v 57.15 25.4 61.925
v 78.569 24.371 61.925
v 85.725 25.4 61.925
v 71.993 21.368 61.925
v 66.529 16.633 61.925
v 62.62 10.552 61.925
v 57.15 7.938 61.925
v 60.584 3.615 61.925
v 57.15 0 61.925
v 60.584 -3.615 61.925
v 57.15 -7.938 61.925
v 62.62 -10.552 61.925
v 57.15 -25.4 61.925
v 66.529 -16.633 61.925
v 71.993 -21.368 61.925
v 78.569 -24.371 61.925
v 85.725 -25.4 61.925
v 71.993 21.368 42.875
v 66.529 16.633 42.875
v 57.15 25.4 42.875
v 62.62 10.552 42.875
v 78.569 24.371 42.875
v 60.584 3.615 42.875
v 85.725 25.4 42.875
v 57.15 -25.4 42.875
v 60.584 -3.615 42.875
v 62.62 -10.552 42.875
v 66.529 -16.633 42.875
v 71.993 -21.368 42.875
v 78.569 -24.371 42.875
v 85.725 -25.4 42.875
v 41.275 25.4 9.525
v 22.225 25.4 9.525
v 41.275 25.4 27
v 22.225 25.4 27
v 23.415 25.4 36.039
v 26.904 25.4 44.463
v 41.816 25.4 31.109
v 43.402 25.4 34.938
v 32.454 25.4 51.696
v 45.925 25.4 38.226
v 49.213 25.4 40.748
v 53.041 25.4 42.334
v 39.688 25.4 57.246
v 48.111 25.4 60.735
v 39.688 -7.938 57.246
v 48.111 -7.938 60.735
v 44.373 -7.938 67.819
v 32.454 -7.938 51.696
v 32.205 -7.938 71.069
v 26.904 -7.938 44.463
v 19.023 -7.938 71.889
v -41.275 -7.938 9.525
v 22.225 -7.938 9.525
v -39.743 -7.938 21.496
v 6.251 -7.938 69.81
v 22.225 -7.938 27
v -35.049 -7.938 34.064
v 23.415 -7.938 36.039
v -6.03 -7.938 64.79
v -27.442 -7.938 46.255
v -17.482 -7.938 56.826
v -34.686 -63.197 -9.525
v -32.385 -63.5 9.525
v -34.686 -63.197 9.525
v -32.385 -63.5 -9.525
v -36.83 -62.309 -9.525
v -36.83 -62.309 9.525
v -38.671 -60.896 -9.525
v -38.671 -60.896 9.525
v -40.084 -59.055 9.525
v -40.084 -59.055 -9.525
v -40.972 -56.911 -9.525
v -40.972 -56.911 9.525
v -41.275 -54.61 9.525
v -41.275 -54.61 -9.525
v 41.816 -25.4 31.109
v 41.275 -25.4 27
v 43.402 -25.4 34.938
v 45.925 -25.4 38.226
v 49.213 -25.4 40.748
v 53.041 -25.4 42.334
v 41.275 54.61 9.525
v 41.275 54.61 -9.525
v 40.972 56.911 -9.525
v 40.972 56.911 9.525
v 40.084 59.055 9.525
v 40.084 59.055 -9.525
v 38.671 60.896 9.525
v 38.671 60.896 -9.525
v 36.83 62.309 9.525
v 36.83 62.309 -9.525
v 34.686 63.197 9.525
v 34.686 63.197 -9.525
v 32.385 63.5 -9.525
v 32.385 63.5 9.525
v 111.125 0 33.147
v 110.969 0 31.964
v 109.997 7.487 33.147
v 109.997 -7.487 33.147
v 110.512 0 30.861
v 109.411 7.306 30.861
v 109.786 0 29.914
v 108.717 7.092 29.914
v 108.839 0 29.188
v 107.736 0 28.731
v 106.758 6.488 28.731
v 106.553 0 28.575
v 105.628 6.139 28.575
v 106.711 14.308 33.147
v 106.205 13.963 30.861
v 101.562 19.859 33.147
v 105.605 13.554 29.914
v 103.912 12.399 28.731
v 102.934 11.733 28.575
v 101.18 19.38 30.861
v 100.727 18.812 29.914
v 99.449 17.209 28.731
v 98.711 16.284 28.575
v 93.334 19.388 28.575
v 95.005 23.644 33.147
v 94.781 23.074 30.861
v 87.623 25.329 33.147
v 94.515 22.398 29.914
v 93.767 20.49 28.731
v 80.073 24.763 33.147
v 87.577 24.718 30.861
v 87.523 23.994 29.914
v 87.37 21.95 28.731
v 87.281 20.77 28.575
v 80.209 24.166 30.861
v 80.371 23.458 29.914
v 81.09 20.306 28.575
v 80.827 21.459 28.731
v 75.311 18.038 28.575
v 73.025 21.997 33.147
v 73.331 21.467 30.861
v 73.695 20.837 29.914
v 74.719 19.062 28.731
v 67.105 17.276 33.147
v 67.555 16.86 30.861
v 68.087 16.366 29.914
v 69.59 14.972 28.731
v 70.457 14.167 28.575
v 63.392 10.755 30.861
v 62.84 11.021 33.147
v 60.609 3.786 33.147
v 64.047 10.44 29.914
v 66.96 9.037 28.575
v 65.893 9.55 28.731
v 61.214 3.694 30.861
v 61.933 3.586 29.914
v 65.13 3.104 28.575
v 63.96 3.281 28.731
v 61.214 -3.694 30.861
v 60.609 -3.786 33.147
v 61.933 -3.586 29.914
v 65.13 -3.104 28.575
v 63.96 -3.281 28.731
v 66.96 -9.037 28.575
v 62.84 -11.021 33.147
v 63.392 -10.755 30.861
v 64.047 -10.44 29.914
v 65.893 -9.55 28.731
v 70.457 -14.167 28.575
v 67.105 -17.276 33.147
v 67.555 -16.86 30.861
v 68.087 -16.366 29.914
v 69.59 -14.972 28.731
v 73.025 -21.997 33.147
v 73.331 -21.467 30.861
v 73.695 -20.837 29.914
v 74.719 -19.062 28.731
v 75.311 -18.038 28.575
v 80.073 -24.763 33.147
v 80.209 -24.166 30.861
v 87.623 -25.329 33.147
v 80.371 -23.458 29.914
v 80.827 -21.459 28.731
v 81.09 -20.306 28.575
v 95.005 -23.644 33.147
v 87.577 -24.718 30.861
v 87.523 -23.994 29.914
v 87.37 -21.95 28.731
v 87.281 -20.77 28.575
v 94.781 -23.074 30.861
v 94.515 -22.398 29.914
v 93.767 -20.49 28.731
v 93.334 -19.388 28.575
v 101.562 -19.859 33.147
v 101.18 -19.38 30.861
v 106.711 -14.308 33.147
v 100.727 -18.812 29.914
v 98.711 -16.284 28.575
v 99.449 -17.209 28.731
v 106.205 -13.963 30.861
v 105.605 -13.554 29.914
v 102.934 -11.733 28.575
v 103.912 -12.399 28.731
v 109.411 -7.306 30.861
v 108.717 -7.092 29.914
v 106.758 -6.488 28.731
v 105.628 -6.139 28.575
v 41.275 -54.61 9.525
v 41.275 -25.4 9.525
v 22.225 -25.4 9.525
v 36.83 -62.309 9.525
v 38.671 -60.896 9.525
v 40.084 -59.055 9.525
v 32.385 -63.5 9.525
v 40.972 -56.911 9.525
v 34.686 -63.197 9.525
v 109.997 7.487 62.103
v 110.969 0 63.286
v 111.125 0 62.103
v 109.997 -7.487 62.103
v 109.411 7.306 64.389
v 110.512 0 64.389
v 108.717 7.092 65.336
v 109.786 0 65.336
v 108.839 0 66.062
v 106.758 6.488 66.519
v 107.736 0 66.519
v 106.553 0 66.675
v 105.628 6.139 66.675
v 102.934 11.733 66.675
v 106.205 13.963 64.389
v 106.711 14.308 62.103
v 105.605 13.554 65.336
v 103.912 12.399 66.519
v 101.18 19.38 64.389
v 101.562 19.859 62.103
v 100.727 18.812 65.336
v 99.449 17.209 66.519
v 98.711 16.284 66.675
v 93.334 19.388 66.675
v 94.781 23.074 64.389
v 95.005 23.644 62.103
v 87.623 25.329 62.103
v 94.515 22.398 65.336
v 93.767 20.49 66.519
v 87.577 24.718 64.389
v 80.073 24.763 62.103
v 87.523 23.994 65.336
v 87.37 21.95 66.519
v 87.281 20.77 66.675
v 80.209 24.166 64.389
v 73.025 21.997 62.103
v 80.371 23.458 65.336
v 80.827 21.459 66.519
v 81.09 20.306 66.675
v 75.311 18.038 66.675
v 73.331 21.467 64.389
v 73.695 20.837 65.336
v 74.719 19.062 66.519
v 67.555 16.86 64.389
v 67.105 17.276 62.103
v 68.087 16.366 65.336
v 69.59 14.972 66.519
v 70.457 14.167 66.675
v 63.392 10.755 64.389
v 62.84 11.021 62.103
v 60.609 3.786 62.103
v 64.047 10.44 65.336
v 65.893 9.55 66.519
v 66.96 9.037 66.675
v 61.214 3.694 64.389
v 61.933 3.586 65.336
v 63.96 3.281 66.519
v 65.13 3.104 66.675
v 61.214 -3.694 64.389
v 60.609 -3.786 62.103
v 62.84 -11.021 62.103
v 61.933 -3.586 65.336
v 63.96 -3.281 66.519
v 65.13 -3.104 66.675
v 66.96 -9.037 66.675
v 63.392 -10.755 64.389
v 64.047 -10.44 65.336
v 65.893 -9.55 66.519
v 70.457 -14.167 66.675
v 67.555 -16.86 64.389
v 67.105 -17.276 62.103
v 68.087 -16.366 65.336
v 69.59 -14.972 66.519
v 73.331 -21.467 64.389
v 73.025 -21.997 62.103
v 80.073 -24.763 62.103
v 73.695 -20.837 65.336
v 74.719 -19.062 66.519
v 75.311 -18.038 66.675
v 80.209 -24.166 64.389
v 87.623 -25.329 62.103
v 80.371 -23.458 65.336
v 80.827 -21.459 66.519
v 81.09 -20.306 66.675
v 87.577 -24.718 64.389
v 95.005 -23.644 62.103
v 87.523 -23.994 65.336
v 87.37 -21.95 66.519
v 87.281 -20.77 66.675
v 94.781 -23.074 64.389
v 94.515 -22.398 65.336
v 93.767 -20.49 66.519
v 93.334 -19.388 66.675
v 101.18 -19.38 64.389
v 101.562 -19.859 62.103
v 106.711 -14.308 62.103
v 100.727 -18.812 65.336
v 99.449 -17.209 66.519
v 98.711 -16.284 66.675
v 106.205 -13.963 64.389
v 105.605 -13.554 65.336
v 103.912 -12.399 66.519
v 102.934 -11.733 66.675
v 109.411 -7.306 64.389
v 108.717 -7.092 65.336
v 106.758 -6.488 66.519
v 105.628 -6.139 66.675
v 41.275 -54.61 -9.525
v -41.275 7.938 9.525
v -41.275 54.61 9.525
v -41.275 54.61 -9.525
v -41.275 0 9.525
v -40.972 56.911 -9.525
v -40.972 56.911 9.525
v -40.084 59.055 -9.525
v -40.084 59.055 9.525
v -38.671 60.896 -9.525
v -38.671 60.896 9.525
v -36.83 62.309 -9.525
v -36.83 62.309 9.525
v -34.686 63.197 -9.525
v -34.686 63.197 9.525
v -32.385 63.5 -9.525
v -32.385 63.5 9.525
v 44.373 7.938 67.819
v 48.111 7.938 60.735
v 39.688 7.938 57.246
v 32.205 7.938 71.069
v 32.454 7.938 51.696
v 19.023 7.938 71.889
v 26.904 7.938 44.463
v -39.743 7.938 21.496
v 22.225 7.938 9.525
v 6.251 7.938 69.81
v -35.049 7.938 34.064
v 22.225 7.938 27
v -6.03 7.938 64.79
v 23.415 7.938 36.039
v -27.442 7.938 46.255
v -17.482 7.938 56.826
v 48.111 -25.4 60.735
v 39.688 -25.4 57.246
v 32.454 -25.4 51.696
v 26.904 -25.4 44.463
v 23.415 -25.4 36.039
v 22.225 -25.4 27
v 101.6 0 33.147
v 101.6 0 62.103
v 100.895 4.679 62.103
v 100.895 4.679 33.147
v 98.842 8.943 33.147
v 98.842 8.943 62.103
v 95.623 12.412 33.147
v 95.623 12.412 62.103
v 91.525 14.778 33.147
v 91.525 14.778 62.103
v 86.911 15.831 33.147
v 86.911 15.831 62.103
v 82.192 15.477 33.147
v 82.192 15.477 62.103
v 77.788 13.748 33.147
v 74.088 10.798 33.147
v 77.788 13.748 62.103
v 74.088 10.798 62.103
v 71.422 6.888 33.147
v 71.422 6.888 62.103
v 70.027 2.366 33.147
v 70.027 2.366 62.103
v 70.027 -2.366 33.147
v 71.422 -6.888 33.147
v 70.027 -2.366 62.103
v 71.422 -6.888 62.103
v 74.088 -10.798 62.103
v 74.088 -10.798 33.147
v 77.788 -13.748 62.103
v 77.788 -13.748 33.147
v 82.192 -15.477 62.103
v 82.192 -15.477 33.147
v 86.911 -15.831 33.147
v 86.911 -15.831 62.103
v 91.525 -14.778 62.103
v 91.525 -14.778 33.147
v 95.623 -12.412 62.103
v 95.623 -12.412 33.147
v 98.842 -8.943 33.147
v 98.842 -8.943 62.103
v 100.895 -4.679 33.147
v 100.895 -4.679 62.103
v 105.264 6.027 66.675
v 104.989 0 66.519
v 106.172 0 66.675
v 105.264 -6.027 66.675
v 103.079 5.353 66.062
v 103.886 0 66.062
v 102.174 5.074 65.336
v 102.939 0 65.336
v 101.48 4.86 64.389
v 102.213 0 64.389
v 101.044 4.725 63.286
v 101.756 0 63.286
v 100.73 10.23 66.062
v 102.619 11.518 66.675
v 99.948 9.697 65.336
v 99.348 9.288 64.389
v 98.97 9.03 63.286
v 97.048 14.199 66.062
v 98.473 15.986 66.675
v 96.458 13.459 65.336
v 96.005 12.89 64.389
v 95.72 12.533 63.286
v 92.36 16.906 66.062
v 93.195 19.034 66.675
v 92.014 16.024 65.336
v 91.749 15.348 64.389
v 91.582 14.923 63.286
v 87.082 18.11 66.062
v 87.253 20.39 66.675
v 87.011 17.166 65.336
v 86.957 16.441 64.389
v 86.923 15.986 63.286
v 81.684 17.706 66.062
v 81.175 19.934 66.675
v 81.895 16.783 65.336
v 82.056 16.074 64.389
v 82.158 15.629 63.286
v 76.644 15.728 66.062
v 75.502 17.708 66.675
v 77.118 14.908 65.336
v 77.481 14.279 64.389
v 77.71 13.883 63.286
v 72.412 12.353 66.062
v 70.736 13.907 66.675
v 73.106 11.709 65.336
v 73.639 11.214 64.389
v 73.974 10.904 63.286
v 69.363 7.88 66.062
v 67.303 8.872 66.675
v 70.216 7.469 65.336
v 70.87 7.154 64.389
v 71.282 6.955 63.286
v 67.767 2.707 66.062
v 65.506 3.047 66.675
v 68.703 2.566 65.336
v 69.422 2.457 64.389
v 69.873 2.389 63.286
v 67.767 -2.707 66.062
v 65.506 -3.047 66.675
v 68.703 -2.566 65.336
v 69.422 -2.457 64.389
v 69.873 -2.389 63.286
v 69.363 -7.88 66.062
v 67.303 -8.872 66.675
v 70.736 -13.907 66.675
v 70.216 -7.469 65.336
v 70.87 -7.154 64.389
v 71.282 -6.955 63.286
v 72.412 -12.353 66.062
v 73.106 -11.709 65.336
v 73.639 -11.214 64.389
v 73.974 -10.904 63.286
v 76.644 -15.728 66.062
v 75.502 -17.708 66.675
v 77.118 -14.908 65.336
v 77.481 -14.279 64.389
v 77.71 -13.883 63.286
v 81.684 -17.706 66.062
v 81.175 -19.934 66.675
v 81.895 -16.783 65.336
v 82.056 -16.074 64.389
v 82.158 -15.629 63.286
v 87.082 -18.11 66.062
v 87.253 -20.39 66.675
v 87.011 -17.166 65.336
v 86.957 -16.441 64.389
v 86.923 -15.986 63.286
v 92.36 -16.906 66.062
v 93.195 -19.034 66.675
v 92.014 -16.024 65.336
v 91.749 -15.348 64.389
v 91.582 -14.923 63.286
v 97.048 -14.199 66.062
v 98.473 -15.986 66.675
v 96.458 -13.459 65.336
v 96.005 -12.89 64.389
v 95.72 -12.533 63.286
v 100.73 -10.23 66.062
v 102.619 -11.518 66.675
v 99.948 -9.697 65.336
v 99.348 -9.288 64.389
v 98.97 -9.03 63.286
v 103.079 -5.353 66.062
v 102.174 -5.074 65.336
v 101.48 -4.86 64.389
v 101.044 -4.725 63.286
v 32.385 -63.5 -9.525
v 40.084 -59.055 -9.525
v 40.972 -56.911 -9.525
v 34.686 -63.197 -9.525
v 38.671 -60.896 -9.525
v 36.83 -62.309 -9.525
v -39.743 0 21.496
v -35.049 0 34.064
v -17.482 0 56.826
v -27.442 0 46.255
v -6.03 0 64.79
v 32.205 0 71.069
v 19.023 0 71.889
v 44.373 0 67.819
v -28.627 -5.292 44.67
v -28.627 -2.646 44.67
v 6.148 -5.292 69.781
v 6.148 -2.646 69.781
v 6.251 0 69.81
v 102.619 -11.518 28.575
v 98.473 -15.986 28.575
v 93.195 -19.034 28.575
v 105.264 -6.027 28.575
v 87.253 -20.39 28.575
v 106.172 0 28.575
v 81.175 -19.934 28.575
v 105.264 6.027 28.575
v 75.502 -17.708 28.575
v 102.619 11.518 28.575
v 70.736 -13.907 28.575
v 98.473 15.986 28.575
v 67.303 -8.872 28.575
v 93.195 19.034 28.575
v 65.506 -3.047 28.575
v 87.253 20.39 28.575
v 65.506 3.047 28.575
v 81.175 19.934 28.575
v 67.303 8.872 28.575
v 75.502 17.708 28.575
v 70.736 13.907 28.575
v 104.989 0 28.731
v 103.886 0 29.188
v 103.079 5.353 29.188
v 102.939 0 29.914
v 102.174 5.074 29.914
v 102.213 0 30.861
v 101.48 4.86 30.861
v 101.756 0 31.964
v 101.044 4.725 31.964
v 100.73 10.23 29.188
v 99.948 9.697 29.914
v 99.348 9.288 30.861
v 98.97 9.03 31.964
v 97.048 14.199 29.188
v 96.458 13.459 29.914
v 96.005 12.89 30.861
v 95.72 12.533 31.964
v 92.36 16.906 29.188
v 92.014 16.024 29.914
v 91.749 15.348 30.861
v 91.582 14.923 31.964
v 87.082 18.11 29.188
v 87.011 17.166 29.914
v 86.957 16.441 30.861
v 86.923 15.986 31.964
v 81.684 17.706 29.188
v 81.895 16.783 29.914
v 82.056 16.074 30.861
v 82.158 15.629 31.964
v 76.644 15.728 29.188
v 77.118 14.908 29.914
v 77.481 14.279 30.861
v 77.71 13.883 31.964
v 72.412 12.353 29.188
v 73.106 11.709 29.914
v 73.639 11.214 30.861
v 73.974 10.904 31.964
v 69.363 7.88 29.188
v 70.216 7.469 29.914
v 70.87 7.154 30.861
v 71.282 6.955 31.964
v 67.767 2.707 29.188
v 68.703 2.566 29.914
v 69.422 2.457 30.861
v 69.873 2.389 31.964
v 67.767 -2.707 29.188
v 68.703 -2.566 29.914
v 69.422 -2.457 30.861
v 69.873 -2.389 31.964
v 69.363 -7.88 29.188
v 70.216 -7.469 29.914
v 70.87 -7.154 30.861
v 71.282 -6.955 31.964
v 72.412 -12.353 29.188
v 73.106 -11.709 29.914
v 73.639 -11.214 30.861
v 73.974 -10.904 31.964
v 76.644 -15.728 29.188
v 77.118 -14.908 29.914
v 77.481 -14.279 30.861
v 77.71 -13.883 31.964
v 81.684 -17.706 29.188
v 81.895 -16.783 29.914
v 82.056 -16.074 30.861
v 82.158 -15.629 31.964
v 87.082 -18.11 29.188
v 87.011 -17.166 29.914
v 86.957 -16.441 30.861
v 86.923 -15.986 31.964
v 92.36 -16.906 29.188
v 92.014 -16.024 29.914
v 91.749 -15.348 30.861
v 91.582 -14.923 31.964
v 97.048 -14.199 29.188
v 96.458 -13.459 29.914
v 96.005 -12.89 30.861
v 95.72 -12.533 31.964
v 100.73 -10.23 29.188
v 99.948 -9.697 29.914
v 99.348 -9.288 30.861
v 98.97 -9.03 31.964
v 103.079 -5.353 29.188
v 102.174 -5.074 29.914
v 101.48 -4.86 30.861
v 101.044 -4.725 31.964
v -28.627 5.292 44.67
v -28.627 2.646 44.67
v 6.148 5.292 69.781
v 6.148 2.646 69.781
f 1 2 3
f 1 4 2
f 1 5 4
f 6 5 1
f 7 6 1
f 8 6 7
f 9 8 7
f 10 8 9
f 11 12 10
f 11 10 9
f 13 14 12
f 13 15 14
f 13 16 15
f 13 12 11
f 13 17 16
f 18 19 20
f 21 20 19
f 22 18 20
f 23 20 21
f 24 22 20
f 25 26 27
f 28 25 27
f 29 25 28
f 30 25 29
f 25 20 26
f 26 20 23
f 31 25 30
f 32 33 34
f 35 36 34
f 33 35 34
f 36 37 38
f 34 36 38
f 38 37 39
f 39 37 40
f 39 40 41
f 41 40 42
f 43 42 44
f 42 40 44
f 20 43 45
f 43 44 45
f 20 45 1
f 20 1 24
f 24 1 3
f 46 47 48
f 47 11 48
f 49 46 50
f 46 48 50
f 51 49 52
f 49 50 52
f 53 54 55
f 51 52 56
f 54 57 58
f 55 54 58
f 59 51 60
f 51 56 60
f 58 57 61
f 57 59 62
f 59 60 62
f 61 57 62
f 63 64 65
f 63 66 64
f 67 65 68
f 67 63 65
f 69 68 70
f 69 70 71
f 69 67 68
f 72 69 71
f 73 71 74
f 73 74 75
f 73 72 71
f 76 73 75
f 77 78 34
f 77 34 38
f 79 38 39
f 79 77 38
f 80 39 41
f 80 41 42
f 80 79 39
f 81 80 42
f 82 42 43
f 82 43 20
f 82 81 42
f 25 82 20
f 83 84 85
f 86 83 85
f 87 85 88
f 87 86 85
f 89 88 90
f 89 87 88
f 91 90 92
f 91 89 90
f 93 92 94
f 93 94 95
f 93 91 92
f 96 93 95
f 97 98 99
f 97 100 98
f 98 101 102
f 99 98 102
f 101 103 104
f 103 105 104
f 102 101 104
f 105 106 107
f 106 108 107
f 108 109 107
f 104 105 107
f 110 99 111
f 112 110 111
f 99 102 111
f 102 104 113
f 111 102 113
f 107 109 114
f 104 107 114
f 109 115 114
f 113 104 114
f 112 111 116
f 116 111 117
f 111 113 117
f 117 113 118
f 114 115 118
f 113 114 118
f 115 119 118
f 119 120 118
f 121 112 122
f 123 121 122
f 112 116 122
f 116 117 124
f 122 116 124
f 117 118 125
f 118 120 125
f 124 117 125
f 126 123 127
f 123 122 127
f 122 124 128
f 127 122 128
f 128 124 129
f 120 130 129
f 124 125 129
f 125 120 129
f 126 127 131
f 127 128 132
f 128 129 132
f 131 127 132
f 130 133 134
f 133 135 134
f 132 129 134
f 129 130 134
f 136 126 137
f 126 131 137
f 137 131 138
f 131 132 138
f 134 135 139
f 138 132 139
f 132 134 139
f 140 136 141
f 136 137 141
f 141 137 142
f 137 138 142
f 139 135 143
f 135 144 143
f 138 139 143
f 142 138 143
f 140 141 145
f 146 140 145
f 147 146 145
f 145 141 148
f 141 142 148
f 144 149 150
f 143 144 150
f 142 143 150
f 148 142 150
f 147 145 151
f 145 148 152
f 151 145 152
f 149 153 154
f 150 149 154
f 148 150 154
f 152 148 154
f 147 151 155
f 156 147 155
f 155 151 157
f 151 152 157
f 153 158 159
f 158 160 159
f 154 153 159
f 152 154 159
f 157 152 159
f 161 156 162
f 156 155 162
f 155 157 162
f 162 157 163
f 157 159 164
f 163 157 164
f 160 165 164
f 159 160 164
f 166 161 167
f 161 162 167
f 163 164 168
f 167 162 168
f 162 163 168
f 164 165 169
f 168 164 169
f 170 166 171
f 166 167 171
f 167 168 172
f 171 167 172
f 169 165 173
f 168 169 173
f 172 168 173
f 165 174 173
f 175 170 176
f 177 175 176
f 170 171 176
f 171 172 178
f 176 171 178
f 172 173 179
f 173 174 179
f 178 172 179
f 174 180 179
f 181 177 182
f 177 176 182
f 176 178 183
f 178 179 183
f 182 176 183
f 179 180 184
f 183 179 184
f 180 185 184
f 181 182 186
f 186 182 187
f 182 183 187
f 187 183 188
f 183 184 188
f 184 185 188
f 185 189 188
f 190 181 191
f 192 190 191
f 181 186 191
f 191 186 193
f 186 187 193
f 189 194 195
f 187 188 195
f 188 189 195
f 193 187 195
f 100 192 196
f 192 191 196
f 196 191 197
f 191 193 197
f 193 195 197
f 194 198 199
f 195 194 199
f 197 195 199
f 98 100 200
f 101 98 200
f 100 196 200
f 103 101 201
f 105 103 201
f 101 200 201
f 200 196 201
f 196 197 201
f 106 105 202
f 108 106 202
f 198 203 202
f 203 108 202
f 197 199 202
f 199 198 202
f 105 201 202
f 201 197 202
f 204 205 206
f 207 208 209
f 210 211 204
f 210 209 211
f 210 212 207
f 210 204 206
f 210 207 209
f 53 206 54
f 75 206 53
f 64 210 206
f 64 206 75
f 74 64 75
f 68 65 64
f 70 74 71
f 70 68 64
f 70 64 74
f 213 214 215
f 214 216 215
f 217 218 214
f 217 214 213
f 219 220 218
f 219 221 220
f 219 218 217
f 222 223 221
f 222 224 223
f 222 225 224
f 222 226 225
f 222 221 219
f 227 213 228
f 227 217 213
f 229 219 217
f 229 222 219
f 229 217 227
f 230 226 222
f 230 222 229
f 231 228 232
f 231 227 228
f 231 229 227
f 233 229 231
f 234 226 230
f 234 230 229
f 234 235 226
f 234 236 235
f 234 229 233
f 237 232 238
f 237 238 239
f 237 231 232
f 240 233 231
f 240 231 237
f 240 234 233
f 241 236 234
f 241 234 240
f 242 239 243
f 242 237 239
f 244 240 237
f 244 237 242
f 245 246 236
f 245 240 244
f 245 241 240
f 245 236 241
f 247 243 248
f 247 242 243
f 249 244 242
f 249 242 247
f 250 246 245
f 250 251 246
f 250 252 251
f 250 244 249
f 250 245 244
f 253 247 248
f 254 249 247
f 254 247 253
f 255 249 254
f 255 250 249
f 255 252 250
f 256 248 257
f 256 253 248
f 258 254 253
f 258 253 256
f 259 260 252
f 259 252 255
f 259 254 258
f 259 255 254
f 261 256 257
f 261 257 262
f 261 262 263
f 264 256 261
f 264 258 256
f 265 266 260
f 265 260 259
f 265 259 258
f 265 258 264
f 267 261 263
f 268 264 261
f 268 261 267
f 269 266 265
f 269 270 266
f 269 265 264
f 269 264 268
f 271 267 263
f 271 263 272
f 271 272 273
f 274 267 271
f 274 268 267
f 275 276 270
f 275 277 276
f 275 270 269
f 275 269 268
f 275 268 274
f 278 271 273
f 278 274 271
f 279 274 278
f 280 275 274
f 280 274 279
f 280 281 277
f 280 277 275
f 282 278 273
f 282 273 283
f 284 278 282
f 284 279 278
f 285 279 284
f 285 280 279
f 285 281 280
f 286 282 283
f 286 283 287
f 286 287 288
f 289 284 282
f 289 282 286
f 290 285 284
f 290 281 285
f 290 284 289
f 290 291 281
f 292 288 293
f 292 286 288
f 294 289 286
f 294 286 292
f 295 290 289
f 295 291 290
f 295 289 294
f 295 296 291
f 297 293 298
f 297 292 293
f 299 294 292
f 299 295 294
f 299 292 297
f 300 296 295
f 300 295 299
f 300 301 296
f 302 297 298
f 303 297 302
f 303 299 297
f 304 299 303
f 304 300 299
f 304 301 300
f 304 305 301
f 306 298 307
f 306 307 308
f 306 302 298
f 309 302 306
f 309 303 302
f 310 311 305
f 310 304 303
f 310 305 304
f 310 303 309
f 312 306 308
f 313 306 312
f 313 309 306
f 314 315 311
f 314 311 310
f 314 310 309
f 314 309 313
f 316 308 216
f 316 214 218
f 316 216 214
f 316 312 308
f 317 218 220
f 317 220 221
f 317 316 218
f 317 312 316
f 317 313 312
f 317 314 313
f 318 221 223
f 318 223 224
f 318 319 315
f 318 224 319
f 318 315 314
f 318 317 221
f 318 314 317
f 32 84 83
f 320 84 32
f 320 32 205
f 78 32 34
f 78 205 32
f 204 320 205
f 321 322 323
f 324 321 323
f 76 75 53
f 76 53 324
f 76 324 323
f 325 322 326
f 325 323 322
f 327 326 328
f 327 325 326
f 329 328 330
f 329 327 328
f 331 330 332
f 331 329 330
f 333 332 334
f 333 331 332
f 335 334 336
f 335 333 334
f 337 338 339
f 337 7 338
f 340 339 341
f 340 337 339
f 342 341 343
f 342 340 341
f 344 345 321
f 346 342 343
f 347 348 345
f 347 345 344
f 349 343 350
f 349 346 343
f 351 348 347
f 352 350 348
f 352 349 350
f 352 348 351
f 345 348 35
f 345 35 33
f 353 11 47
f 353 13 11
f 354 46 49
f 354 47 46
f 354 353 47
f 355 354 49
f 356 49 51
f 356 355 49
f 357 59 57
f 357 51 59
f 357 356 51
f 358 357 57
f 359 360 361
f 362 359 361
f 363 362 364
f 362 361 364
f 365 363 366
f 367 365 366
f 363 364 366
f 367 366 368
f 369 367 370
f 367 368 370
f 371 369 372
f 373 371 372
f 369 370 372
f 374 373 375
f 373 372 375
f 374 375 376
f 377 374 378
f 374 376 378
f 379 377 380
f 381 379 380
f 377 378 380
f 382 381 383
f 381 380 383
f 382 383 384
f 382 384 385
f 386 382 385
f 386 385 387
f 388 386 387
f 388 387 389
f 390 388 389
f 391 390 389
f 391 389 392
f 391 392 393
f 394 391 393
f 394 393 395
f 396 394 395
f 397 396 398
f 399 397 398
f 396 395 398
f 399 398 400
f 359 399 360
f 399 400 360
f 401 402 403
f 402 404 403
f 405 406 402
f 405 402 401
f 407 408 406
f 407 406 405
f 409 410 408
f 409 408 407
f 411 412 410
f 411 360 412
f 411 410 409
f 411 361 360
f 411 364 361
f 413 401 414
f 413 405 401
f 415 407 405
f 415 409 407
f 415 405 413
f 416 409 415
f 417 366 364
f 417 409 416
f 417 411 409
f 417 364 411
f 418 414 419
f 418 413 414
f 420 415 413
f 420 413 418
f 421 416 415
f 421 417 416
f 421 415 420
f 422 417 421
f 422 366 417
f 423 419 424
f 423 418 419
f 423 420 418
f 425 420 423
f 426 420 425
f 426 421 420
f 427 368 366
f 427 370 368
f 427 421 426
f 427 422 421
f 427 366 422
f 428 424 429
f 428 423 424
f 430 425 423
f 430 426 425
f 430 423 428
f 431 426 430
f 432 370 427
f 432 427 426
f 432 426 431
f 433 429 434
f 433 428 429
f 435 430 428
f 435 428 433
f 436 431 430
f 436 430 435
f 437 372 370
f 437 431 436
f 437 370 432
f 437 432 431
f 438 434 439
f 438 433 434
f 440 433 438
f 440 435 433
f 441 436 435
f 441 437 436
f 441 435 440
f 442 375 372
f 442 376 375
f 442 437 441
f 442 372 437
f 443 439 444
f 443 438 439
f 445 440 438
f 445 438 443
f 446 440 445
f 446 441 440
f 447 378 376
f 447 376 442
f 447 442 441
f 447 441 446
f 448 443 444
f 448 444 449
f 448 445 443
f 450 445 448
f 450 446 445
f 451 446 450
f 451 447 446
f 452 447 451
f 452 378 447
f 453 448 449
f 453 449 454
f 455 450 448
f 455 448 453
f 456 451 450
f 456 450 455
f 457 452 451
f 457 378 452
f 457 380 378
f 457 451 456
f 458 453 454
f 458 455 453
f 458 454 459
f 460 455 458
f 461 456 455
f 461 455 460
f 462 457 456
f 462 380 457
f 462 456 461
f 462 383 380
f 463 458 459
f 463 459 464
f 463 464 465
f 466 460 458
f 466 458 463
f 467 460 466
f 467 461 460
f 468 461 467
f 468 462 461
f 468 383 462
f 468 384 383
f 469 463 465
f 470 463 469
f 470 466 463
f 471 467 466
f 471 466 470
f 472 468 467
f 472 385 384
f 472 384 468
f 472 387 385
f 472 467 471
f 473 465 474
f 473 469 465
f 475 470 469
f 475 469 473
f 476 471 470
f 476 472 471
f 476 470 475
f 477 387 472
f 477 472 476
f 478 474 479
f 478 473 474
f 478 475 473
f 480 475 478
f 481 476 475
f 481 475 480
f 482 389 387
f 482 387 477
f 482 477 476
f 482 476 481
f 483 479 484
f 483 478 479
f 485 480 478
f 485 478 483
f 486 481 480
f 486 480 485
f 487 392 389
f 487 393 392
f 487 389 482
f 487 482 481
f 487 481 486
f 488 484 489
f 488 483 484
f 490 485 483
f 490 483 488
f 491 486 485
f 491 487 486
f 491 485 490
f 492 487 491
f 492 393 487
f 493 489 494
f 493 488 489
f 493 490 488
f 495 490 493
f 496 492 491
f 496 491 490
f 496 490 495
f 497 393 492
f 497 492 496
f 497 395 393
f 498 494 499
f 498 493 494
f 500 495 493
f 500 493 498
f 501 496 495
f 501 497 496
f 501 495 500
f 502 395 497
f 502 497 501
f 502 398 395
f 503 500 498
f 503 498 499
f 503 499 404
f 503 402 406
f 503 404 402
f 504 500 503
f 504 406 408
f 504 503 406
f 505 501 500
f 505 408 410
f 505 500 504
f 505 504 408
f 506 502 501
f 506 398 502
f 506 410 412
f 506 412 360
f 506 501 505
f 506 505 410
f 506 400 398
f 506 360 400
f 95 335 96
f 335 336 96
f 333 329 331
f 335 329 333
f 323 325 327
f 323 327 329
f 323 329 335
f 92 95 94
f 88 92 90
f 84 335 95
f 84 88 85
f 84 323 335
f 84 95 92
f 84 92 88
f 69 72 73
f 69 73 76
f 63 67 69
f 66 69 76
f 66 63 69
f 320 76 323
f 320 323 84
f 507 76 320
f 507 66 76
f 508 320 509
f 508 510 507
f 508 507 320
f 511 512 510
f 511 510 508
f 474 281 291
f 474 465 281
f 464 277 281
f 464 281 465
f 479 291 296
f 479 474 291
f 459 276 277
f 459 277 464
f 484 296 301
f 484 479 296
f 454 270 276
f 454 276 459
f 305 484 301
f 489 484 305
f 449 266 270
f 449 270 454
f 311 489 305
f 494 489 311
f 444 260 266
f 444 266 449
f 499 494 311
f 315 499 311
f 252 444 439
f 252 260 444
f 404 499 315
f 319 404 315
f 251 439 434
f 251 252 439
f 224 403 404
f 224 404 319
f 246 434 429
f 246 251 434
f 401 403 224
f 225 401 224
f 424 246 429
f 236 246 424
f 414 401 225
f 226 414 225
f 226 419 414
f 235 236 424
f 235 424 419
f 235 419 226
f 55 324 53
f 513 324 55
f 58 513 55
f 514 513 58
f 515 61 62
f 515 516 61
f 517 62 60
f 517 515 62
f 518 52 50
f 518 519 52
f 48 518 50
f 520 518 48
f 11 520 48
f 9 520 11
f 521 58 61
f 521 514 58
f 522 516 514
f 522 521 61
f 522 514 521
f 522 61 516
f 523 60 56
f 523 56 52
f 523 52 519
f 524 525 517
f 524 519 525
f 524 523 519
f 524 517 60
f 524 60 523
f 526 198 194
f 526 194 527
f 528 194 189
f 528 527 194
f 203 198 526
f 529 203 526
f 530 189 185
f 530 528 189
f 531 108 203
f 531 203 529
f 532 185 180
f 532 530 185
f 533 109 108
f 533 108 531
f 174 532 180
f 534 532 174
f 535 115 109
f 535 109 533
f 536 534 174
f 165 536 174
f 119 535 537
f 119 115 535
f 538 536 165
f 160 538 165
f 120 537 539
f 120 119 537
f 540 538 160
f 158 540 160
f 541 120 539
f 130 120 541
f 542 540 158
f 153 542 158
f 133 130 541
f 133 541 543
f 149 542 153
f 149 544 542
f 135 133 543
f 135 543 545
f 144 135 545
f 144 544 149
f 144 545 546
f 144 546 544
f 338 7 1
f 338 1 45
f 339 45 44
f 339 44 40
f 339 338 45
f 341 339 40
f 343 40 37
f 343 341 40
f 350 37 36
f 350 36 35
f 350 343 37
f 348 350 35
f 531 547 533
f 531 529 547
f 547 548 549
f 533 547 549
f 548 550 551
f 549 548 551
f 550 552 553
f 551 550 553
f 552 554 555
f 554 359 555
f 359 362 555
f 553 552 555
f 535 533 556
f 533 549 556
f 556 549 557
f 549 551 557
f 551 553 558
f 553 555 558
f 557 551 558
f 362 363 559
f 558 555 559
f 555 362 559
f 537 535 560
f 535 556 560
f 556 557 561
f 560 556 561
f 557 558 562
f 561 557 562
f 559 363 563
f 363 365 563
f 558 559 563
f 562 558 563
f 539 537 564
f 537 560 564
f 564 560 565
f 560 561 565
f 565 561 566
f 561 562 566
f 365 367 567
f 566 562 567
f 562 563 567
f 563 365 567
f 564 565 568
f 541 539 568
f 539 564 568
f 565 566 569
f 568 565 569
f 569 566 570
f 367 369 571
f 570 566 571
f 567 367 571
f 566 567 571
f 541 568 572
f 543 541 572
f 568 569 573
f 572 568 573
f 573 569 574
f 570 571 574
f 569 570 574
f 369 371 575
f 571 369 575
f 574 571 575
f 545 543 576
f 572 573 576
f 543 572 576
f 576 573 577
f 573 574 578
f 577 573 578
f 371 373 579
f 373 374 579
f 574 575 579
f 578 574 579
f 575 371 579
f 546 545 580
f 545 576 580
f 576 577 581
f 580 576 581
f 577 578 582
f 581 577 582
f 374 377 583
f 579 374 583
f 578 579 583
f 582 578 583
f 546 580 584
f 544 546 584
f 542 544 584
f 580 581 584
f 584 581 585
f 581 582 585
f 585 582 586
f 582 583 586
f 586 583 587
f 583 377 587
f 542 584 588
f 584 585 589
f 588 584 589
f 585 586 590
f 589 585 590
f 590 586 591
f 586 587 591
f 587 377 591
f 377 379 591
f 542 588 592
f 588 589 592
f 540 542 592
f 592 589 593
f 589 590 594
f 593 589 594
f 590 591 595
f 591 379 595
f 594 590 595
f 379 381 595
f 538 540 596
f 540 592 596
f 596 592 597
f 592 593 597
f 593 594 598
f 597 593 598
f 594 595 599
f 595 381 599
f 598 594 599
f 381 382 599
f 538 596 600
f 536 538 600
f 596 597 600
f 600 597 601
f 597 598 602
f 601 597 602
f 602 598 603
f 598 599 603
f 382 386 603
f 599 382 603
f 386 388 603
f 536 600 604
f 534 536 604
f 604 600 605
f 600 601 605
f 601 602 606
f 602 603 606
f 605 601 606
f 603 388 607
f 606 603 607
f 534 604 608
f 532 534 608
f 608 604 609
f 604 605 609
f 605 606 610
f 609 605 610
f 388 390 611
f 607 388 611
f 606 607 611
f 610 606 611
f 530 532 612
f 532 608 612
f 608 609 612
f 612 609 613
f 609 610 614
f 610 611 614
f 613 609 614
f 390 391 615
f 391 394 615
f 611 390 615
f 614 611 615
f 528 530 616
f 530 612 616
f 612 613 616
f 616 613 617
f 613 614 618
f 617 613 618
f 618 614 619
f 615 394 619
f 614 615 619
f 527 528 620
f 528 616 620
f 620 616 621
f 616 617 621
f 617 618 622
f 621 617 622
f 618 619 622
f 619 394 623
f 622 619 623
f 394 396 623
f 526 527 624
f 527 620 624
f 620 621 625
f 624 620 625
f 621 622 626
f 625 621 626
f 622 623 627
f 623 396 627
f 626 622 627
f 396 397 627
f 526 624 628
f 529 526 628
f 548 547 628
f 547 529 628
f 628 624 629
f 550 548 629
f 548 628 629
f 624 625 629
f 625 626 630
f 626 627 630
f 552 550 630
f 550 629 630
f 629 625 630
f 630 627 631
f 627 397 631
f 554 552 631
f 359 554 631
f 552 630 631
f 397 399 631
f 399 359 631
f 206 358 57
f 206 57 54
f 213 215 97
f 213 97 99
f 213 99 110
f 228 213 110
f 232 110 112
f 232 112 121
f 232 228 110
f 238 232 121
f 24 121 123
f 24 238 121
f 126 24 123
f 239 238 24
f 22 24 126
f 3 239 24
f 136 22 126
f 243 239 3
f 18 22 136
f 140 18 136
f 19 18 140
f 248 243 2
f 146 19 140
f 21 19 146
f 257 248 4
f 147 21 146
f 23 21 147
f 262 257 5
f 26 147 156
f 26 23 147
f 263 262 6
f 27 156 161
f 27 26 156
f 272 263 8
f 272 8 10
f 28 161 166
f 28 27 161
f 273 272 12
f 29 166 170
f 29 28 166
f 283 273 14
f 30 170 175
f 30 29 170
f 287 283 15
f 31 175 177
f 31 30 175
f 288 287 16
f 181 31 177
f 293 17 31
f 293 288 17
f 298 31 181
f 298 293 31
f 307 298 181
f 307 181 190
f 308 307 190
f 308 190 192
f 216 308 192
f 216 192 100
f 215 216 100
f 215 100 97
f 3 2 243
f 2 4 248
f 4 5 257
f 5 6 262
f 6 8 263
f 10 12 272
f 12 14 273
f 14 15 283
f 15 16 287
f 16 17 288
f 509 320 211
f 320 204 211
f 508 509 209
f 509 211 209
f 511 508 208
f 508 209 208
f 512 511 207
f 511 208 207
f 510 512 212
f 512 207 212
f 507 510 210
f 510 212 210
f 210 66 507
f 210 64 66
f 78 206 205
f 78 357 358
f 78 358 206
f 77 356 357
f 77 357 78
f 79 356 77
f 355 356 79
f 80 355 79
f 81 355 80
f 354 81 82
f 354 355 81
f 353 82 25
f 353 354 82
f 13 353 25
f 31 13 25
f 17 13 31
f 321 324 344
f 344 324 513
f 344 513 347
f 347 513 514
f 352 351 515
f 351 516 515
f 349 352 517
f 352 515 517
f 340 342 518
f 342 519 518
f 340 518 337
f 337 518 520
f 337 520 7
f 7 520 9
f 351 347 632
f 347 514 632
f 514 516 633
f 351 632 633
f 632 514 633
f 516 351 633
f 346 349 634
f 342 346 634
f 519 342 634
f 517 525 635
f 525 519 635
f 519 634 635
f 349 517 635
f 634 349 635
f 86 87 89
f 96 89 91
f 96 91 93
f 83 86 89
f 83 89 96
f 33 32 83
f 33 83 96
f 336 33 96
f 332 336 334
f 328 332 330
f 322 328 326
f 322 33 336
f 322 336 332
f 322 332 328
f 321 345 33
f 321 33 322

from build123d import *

# Parameters (mm, degrees)
F1_DEPTH = 63.5
F0_W     = 25.4
F0_H     = 19.05
F2_DEPTH = 25.4
F3_DEPTH = 7.9375
F5_R     = 8.89
F6_R     = 15.875
F7_DEPTH = 38.1
F8_R     = 4.572


with BuildPart() as f1:
    # F0 (on Front) → F1 (new body, symmetric)
    with BuildSketch(Plane.XZ):
        Polygon((-41.275, -9.525), (41.275, -9.525), (41.275, 9.525), (22.225, 9.525), (-41.275, 9.525), align=None)
    extrude(amount=F1_DEPTH, both=True)

    # F0 (on Front) → F2 (join, symmetric)
    with BuildSketch(Plane.XZ):
        with BuildLine():
            Line((22.225, 9.525), (41.275, 9.525))
            Line((41.275, 9.525), (41.275, 27.0002))
            ThreePointArc((41.275, 27.0002), (45.9246798487, 38.2255201513), (57.15, 42.8752))
            Line((57.15, 42.8752), (60.325, 42.8752))
            Line((60.325, 42.8752), (60.325, 61.9252))
            Line((60.325, 61.9252), (57.15, 61.9252))
            ThreePointArc((57.15, 61.9252), (32.4542956671, 51.6959043329), (22.225, 27.0002))
            Line((22.225, 27.0002), (22.225, 9.525))
        make_face()
        with Locations((73.025, 52.4002)):
            Rectangle(F0_W, F0_H)
    extrude(amount=F2_DEPTH, both=True)

    # F0 (on Front) → F3 (join, symmetric)
    with BuildSketch(Plane.XZ):
        with BuildLine():
            add(Edge.make_bspline(
                [(-41.275, 9.525), (-41.656780988, 42.0436710119), (0, 93.9072296023), (57.15, 61.9252)],
                knots=[0, 0, 0, 0, 111.5045361635, 111.5045361635, 111.5045361635, 111.5045361635], degree=3))
            Line((-41.275, 9.525), (22.225, 9.525))
            Line((22.225, 9.525), (22.225, 27.0002))
            ThreePointArc((22.225, 27.0002), (32.4542956671, 51.6959043329), (57.15, 61.9252))
        make_face()
    extrude(amount=F3_DEPTH, both=True)

    # F0 (on Front) → F4 (revolve)
    with BuildSketch(Plane.XZ):
        Polygon((85.725, 66.675), (85.725, 61.9252), (85.725, 42.8752), (85.725, 28.575), (111.125, 28.575), (111.125, 66.675), align=None)
    revolve(axis=Axis((85.725, 0, 47.625), (0, 0, 1)))

    # F5
    f5_edges = [f1.edges().sort_by_distance(p)[0] for p in [
        (-41.275, -63.5, 0),
        (41.275, -63.5, 0),
        (41.275, 63.5, 0),
        (-41.275, 63.5, 0),
    ]]
    fillet(f5_edges, radius=F5_R)

    # F6 (on face) → F7 (cut, through all)
    with BuildSketch(Plane.XY.offset(66.675)):
        with Locations((85.725, 0)):
            Circle(F6_R)
    extrude(amount=-F7_DEPTH, mode=Mode.SUBTRACT)

    # F8
    f8_edges = [f1.edges().sort_by_distance(p)[0] for p in [
        (69.85, 0, 66.675),
        (69.85, 0, 28.575),
        (60.325, 0, 66.675),
        (60.325, 0, 28.575),
    ]]
    fillet(f8_edges, radius=F8_R)


solid = f1.part
